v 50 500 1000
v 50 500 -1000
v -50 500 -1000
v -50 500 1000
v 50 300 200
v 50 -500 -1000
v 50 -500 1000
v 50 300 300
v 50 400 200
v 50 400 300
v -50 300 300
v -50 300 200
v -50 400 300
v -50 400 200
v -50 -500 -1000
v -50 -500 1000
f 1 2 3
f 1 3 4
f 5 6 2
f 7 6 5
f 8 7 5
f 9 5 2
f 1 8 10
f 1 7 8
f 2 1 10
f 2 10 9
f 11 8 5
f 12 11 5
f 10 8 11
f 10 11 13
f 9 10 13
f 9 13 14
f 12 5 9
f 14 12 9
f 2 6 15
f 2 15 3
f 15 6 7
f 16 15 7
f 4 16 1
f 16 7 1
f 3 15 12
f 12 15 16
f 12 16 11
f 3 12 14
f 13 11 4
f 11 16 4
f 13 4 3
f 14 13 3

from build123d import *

# Parameters (mm, degrees)
SKETCH1_W           = 1000
SKETCH1_H           = 1000
BOSS_EXTRUDE1_DEPTH = 50
SKETCH2_W           = 100
SKETCH2_H           = 100
CUT_EXTRUDE1_DEPTH  = 1123.497216032
SKETCH3_W           = 1000
SKETCH3_H           = 1000
BOSS_EXTRUDE2_DEPTH = 50


with BuildPart() as part:
    # Sketch1 → Boss-Extrude1 (new, symmetric)
    with BuildSketch(Plane.YZ):
        with Locations((0, 500)):
            Rectangle(SKETCH1_W, SKETCH1_H)
    extrude(amount=BOSS_EXTRUDE1_DEPTH, both=True)

    # Sketch2 → Cut-Extrude1 (cut, through all)
    with BuildSketch(Plane(origin=(50, 0, 0), x_dir=(0, 0, -1), z_dir=(1, 0, 0))):
        with Locations((-250, 350)):
            Rectangle(SKETCH2_W, SKETCH2_H)
    extrude(amount=-CUT_EXTRUDE1_DEPTH, mode=Mode.SUBTRACT)

    # Sketch3 → Boss-Extrude2 (add, symmetric)
    with BuildSketch(Plane.YZ):
        with Locations((0, -500)):
            Rectangle(SKETCH3_W, SKETCH3_H)
    extrude(amount=BOSS_EXTRUDE2_DEPTH, both=True)


solid = part.part
